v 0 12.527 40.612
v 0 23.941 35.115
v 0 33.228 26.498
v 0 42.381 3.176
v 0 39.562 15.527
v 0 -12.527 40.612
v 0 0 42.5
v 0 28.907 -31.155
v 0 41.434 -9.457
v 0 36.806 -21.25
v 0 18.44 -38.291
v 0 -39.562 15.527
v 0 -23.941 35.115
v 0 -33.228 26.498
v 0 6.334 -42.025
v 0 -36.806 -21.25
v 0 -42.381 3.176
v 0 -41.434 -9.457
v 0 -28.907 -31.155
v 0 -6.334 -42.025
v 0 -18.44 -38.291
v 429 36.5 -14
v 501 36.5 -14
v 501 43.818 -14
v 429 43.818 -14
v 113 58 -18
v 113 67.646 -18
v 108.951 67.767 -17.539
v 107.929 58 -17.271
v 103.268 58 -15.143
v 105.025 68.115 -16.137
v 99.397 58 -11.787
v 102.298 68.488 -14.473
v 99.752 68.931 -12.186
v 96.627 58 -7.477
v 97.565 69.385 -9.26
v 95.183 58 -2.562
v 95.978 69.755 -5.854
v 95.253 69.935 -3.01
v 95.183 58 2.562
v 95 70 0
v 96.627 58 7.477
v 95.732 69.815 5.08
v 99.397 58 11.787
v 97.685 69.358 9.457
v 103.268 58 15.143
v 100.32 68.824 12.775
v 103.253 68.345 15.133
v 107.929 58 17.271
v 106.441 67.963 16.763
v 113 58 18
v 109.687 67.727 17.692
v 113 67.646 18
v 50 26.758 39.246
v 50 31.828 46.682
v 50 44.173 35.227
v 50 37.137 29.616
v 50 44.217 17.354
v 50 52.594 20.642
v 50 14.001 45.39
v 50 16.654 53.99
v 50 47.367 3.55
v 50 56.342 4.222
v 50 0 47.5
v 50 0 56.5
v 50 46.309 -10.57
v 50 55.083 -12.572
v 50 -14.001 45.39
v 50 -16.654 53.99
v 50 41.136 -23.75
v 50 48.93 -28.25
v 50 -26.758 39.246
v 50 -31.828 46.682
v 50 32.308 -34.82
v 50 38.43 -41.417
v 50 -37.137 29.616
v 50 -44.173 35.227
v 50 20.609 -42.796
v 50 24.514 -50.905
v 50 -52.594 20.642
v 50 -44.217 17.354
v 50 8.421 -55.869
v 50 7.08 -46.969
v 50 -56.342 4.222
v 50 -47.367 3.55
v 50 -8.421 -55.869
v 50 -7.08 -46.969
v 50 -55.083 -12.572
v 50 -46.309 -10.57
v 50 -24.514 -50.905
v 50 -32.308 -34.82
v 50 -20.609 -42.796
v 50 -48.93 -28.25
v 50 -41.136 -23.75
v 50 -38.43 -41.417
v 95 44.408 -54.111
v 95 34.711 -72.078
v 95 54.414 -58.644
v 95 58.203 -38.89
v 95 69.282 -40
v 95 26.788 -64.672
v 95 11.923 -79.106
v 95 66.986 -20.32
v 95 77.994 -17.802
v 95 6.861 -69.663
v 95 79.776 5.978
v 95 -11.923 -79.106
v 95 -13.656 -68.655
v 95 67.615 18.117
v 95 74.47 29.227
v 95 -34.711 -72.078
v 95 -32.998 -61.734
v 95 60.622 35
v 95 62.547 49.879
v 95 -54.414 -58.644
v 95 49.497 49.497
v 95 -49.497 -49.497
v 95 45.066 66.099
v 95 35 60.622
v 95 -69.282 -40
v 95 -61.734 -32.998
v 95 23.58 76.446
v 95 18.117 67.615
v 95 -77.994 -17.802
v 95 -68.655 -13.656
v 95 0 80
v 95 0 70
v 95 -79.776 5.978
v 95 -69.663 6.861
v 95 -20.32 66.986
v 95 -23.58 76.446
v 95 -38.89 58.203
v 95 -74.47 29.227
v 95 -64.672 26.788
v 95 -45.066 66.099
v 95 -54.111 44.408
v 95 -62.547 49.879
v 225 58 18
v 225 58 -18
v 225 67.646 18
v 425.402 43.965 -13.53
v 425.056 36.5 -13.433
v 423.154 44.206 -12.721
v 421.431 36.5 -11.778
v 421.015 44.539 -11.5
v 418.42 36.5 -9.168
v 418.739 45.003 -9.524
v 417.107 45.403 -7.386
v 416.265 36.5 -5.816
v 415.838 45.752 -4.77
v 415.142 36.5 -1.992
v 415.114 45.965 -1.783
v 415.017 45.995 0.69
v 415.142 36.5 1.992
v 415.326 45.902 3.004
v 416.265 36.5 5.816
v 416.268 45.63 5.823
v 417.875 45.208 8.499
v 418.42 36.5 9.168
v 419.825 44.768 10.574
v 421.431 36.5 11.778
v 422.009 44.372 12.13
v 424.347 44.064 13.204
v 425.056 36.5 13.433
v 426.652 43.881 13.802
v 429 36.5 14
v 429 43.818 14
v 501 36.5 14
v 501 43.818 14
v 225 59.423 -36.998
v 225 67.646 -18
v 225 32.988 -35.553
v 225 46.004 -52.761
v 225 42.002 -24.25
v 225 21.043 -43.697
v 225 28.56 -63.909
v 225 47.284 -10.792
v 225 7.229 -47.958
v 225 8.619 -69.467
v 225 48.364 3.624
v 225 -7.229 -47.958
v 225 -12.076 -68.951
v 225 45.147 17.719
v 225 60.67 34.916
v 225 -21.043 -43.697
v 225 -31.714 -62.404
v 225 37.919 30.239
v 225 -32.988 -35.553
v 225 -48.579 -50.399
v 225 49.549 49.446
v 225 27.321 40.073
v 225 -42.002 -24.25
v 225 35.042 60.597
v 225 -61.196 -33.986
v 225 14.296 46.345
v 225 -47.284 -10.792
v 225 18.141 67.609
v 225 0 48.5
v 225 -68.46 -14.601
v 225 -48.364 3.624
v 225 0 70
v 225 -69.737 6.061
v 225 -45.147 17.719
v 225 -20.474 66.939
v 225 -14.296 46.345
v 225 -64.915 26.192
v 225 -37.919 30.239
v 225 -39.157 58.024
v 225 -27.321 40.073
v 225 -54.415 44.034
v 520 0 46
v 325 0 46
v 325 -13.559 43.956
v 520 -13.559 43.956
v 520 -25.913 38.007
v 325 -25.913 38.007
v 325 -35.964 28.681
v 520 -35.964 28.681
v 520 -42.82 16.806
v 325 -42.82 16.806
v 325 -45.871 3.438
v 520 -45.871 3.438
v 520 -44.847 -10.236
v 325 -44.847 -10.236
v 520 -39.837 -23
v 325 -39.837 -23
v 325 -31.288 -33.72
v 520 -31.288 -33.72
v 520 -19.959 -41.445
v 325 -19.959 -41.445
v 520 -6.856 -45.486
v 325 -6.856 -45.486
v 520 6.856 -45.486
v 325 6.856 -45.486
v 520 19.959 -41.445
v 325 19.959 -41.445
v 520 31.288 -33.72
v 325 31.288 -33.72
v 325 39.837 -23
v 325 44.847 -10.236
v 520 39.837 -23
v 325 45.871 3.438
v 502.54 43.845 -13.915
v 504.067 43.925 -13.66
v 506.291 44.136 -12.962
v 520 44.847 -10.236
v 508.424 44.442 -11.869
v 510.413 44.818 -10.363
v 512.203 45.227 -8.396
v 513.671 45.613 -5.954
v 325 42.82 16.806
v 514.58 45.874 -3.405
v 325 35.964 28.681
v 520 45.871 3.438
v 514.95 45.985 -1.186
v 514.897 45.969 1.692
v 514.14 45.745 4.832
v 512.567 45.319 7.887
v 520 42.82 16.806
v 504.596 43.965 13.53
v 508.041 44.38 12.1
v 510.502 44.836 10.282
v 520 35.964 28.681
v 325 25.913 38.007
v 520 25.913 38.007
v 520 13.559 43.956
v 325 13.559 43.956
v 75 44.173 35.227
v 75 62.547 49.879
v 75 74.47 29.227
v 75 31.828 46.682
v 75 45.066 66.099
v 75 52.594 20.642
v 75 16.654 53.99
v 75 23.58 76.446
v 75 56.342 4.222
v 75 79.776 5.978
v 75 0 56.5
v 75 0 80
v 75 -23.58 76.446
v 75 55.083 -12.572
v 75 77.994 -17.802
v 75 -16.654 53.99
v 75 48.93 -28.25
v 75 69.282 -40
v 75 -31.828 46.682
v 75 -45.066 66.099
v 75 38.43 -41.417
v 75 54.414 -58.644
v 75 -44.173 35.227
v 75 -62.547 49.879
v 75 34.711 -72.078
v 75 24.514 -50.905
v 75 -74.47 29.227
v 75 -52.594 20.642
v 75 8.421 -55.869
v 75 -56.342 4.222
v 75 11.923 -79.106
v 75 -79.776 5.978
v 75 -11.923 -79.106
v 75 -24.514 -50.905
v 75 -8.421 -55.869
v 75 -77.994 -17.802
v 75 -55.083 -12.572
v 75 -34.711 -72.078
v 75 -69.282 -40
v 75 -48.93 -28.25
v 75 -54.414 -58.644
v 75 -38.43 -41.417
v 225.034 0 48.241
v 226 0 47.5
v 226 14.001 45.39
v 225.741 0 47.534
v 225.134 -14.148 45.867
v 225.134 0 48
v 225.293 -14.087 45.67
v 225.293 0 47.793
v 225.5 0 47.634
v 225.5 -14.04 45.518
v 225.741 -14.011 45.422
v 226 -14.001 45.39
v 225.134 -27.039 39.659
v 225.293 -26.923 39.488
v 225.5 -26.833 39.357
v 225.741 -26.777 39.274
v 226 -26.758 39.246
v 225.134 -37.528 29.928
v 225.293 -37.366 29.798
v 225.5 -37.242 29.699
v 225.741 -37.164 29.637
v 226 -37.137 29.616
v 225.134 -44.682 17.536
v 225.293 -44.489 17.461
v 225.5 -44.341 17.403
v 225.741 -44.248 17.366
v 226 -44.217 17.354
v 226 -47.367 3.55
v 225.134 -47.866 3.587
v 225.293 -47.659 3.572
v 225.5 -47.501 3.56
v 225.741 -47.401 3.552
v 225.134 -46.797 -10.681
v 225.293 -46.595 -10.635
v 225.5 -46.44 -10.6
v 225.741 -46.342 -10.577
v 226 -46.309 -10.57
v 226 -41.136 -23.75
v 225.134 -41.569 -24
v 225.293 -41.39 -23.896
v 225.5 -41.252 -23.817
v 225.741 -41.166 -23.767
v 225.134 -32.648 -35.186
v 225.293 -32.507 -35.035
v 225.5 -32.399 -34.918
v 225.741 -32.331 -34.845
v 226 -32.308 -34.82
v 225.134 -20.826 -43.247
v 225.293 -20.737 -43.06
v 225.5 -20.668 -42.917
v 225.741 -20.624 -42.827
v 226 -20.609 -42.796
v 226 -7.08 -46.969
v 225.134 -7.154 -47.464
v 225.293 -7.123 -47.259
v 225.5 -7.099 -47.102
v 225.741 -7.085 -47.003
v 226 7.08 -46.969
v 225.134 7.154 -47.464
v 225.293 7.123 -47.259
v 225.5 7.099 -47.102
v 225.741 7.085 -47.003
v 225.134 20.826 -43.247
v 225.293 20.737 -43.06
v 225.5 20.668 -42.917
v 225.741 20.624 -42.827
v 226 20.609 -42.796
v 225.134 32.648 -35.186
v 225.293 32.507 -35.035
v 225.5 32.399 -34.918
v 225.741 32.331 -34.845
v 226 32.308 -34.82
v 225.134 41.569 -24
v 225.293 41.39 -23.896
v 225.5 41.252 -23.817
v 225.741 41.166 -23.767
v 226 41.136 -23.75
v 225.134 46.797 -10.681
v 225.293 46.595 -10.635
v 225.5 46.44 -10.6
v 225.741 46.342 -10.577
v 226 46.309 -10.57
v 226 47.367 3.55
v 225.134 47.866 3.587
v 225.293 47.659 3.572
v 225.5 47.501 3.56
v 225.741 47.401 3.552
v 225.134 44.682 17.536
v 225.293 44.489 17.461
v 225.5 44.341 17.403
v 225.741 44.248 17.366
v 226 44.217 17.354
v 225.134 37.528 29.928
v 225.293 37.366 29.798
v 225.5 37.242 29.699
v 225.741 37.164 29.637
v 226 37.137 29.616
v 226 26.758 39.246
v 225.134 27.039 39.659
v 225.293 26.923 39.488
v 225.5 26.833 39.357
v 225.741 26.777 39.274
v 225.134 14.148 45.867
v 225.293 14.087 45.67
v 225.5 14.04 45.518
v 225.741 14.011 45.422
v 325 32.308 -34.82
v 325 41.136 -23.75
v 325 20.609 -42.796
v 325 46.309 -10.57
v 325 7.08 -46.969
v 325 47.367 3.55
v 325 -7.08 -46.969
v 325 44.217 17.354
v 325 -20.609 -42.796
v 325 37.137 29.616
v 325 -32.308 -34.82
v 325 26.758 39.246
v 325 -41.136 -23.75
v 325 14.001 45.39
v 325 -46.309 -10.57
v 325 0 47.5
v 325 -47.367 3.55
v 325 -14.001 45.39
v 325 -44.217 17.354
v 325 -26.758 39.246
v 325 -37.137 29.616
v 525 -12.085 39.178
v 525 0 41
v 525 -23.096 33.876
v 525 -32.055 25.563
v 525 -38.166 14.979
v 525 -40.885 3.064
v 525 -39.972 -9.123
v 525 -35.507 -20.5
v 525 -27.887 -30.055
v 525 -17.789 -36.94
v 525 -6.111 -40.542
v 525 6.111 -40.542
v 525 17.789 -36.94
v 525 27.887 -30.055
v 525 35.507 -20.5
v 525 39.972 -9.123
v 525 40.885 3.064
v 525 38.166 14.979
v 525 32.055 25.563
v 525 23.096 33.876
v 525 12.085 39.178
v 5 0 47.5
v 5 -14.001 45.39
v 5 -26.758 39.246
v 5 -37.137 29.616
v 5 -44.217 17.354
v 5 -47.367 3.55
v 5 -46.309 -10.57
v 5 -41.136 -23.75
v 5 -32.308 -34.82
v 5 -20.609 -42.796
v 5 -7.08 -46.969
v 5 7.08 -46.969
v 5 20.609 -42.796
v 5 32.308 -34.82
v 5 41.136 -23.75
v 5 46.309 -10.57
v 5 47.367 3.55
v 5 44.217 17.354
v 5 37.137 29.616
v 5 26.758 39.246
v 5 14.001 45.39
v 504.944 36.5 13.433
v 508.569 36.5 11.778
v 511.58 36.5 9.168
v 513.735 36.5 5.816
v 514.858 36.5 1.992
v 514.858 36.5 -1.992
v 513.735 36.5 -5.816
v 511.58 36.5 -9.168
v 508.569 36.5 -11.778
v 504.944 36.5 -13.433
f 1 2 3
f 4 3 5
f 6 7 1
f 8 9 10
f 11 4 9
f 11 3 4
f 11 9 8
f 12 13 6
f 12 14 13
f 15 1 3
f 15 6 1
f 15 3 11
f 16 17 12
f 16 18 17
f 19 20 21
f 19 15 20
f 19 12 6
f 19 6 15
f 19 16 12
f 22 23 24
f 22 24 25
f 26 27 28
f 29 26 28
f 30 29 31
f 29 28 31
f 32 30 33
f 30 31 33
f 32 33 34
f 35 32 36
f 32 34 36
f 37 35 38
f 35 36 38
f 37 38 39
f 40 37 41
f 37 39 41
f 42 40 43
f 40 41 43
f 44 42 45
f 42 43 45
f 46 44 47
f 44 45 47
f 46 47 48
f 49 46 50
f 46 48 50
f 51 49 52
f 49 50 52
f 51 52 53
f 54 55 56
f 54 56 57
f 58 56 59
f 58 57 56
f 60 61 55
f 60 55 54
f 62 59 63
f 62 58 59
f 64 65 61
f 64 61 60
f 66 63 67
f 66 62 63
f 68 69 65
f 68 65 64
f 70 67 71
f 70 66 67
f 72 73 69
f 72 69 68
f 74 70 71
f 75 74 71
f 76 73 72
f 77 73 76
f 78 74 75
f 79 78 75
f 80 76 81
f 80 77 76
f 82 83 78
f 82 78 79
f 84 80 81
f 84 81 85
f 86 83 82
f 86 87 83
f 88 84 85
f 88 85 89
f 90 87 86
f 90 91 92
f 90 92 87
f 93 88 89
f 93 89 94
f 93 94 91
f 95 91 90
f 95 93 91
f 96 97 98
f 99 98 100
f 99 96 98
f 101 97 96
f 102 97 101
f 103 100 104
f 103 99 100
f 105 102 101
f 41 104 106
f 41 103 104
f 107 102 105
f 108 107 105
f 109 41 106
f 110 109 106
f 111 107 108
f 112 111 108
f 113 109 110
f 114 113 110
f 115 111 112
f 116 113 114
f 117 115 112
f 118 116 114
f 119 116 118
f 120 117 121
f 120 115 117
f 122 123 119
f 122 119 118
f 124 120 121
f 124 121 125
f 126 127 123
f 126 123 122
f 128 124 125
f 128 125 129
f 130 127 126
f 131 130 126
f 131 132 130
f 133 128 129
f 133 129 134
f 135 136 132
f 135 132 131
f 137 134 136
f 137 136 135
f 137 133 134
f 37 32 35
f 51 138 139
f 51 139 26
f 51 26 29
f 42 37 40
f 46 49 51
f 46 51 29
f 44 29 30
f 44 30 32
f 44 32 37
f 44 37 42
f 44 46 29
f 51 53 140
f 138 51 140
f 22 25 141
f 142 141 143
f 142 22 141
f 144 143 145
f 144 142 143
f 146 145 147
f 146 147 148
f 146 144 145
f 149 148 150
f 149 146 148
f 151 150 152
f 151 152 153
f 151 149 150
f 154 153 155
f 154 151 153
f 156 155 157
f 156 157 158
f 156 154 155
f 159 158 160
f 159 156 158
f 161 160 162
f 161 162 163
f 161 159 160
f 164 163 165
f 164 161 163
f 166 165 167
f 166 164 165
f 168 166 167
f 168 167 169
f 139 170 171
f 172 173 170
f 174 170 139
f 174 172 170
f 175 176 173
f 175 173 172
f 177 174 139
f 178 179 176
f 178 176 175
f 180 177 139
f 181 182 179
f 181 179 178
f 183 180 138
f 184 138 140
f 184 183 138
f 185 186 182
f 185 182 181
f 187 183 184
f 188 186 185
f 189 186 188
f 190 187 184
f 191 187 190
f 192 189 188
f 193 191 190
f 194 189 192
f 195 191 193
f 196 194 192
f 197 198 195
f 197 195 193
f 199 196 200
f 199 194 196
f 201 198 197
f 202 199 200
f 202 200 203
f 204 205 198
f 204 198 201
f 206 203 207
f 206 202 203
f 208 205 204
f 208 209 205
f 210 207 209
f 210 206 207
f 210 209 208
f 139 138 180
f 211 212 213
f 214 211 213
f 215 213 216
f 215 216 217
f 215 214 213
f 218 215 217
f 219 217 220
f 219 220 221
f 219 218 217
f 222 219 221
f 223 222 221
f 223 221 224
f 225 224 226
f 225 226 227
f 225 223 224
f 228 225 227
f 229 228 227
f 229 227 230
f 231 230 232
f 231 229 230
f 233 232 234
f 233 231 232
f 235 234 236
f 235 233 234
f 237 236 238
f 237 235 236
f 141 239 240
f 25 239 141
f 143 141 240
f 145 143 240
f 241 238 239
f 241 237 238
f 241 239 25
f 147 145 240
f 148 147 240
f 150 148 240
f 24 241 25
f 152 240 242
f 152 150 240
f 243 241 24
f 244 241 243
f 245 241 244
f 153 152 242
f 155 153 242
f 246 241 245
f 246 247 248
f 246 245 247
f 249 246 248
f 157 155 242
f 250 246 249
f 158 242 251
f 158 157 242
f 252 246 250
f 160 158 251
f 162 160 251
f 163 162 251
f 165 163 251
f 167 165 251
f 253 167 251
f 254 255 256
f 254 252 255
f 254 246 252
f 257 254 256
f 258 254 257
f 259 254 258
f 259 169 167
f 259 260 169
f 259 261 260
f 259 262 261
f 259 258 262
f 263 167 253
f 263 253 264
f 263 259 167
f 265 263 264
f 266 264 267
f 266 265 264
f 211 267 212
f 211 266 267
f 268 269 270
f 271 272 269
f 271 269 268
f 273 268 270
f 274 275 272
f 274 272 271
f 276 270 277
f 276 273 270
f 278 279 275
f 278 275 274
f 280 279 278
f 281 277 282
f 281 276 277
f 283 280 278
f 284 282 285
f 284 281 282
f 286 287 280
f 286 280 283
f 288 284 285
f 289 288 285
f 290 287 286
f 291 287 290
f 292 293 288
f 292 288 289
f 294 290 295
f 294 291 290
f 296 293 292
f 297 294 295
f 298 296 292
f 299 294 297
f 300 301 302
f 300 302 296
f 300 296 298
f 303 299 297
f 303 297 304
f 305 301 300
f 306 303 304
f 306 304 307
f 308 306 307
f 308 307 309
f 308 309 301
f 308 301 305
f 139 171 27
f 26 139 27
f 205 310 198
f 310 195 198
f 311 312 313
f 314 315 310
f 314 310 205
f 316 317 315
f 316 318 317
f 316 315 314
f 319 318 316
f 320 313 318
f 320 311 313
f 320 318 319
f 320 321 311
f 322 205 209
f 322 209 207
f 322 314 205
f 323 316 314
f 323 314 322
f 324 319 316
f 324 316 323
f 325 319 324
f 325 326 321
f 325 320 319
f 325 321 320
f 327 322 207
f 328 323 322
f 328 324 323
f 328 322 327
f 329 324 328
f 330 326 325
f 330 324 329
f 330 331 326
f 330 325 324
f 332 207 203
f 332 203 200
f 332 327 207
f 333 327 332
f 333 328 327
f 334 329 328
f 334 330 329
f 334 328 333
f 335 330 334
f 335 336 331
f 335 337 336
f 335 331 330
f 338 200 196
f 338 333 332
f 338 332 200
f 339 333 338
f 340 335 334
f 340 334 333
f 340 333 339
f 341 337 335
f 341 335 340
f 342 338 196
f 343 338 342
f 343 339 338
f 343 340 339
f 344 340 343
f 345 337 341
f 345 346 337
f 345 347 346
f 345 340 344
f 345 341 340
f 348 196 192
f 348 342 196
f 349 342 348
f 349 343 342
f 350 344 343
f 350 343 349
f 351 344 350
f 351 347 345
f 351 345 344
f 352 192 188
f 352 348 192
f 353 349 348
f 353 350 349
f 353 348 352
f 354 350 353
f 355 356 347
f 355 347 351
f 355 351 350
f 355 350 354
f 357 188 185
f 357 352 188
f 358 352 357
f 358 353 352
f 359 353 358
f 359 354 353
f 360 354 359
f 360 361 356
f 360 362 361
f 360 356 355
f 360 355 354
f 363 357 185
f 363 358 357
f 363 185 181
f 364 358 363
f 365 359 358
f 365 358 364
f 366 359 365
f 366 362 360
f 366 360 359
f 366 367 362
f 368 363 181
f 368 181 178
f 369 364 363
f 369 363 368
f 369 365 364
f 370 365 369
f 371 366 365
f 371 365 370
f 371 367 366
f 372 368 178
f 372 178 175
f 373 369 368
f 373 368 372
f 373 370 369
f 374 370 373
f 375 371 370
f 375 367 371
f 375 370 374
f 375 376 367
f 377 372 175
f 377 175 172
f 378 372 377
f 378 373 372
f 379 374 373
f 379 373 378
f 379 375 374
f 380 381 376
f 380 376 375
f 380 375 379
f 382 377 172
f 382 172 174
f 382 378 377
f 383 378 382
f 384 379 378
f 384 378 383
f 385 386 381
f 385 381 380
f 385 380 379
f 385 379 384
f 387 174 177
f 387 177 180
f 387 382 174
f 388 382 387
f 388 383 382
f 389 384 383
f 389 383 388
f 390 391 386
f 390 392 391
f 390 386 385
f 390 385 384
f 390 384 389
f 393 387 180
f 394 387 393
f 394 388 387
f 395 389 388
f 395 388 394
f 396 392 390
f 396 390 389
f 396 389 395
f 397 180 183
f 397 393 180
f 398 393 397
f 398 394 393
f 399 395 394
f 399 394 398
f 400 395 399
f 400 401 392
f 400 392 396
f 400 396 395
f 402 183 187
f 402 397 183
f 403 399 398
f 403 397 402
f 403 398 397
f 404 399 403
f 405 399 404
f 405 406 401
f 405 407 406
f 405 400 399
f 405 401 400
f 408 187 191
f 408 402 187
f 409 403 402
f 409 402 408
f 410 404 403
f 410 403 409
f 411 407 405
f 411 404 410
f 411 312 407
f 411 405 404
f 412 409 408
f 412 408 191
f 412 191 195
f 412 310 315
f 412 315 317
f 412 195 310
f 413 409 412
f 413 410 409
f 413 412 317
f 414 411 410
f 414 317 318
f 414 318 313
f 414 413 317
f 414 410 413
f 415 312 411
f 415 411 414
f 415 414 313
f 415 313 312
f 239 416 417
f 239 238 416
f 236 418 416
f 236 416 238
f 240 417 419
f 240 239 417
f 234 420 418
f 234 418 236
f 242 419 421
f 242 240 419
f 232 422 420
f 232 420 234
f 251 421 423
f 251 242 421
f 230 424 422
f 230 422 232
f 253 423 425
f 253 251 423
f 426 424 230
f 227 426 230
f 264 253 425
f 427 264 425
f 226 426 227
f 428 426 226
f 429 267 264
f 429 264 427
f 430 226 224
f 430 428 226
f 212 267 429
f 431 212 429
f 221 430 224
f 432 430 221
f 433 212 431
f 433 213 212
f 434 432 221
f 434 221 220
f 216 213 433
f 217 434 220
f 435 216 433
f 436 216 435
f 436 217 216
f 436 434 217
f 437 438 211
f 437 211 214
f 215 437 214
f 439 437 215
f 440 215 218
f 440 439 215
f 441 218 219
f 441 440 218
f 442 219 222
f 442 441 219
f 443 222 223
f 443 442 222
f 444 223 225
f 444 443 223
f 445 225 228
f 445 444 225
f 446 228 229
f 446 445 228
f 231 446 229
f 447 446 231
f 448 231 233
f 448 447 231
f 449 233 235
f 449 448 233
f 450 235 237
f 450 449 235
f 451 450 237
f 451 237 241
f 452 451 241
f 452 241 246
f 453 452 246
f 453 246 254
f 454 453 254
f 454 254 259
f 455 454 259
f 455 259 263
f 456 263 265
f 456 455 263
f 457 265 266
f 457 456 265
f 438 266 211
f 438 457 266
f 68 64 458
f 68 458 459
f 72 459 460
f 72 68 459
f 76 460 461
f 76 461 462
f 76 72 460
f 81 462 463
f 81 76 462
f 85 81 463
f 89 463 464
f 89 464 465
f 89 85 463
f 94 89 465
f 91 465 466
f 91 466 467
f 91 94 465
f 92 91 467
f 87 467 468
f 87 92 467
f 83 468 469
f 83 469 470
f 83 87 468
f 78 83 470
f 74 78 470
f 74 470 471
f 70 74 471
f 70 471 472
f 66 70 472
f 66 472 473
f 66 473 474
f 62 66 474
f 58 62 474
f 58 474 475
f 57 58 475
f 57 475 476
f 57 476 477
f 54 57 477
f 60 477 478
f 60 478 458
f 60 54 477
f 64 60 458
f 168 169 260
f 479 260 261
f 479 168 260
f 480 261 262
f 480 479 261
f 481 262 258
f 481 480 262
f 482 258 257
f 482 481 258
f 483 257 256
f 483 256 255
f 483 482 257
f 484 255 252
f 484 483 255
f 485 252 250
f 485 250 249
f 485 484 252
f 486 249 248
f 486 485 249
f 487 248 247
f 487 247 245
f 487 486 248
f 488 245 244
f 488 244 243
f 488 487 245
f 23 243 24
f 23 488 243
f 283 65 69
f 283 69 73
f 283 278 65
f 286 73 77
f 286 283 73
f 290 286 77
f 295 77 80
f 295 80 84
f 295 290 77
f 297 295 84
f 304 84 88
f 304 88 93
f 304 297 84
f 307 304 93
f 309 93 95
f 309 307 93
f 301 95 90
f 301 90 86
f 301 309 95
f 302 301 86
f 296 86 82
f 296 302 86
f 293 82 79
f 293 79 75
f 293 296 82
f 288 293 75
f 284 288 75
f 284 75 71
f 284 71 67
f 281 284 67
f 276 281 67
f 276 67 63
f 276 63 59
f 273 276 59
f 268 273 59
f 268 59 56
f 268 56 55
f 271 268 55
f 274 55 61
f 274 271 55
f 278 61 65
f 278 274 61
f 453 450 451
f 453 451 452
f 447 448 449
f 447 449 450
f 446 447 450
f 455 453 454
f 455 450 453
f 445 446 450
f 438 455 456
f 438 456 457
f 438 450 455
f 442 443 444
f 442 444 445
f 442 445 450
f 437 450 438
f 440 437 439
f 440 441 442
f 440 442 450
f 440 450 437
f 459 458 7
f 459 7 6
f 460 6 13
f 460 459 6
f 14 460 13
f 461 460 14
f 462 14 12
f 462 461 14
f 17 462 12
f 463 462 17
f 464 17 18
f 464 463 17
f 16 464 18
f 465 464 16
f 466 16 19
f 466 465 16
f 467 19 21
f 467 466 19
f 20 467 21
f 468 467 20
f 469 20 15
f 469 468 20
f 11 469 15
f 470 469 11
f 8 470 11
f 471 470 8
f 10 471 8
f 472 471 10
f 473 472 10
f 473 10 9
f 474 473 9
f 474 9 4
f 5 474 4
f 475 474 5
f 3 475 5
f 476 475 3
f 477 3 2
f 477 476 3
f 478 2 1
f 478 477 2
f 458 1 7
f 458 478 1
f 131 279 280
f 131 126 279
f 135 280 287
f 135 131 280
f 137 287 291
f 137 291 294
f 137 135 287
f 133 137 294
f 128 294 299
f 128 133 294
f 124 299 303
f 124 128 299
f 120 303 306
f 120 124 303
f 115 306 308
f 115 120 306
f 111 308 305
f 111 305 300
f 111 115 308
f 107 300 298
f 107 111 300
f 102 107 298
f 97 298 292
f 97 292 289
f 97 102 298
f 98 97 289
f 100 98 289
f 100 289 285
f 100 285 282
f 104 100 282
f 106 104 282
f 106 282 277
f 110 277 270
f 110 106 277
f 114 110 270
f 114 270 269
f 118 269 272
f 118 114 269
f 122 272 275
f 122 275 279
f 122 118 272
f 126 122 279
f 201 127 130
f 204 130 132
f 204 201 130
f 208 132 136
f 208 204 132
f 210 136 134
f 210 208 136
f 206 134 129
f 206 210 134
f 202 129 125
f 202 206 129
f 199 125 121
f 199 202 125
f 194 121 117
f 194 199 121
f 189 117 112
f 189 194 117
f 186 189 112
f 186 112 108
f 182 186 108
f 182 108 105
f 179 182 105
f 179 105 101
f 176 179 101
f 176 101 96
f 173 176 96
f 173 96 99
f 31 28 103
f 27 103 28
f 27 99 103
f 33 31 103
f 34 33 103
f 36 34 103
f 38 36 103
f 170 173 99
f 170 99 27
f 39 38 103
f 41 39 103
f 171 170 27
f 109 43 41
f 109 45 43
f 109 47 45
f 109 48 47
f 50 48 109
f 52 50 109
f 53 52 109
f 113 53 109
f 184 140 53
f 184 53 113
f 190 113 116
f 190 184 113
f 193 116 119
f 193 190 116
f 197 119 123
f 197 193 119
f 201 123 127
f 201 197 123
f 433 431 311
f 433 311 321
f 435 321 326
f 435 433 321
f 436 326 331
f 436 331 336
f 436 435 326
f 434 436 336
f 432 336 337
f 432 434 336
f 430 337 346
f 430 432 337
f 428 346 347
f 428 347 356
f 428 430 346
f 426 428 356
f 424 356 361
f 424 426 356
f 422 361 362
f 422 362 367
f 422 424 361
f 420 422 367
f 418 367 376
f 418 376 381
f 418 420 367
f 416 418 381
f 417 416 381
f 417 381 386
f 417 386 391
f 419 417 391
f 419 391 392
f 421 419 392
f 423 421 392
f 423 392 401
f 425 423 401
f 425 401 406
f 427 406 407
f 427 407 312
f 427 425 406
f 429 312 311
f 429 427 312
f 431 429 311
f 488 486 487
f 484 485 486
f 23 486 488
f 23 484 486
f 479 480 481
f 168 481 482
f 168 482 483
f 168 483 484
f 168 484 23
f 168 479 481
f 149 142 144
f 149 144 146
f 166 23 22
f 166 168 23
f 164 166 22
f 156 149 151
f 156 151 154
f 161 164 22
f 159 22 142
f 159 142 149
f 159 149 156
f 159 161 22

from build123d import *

# Parameters (mm, degrees)
CUT_EXTRUDE_1_DEPTH = 12
CUT_EXTRUDE_START   = 36.5
CUT_EXTRUDE_2_DEPTH = 501.552138996
CHAMFER_1_SIZE      = 5
FILLET_1_R          = 1


with BuildPart() as part:
    # 草图1 → 旋转1 (revolve)
    with BuildSketch(Plane.XY, mode=Mode.PRIVATE) as revolve_1_sk:
        Polygon((0, 0), (0, 47.5), (50, 47.5), (50, 56.5), (75, 56.5), (75, 80), (95, 80), (95, 70), (225, 70), (225, 47.5), (325, 47.5), (325, 46), (525, 46), (525, 0), align=None)
    revolve(revolve_1_sk.sketch.rotate(Axis((0, 0, 0), (1, 0, 0)), 90), axis=Axis((0, 0, 0), (1, 0, 0)))

    # 草图2 → 切除-拉伸1 (cut)
    with BuildSketch(Plane(origin=(0, 70, 0), x_dir=(-1, 0, 0), z_dir=(0, 1, 0))):
        with BuildLine():
            Line((-225, 18), (-225, -18))
            Line((-225, -18), (-113, -18))
            ThreePointArc((-113, -18), (-95, 0), (-113, 18))
            Line((-113, 18), (-225, 18))
        make_face()
    extrude(amount=-CUT_EXTRUDE_1_DEPTH, mode=Mode.SUBTRACT)

    # 草图3 → 切除-拉伸2 (cut, through all)
    with BuildSketch(Plane(origin=(0, 0, 0), x_dir=(-1, 0, 0), z_dir=(0, 1, 0)).offset(CUT_EXTRUDE_START)):
        with BuildLine():
            Line((-429, 14), (-501, 14))
            ThreePointArc((-501, 14), (-515, 0), (-501, -14))
            Line((-501, -14), (-429, -14))
            ThreePointArc((-429, -14), (-415, 0), (-429, 14))
        make_face()
    extrude(amount=CUT_EXTRUDE_2_DEPTH, mode=Mode.SUBTRACT)

    # 倒角1
    chamfer_1_edges = [part.edges().sort_by_distance(p)[0] for p in [
        (0, 0, -47.5),
        (525, 0, -46),
    ]]
    chamfer(chamfer_1_edges, length=CHAMFER_1_SIZE)

    # 圆角1
    fillet_1_edges = [part.edges().sort_by_distance(p)[0] for p in [
        (225, 0, -47.5),
    ]]
    fillet(fillet_1_edges, radius=FILLET_1_R)


solid = part.part
